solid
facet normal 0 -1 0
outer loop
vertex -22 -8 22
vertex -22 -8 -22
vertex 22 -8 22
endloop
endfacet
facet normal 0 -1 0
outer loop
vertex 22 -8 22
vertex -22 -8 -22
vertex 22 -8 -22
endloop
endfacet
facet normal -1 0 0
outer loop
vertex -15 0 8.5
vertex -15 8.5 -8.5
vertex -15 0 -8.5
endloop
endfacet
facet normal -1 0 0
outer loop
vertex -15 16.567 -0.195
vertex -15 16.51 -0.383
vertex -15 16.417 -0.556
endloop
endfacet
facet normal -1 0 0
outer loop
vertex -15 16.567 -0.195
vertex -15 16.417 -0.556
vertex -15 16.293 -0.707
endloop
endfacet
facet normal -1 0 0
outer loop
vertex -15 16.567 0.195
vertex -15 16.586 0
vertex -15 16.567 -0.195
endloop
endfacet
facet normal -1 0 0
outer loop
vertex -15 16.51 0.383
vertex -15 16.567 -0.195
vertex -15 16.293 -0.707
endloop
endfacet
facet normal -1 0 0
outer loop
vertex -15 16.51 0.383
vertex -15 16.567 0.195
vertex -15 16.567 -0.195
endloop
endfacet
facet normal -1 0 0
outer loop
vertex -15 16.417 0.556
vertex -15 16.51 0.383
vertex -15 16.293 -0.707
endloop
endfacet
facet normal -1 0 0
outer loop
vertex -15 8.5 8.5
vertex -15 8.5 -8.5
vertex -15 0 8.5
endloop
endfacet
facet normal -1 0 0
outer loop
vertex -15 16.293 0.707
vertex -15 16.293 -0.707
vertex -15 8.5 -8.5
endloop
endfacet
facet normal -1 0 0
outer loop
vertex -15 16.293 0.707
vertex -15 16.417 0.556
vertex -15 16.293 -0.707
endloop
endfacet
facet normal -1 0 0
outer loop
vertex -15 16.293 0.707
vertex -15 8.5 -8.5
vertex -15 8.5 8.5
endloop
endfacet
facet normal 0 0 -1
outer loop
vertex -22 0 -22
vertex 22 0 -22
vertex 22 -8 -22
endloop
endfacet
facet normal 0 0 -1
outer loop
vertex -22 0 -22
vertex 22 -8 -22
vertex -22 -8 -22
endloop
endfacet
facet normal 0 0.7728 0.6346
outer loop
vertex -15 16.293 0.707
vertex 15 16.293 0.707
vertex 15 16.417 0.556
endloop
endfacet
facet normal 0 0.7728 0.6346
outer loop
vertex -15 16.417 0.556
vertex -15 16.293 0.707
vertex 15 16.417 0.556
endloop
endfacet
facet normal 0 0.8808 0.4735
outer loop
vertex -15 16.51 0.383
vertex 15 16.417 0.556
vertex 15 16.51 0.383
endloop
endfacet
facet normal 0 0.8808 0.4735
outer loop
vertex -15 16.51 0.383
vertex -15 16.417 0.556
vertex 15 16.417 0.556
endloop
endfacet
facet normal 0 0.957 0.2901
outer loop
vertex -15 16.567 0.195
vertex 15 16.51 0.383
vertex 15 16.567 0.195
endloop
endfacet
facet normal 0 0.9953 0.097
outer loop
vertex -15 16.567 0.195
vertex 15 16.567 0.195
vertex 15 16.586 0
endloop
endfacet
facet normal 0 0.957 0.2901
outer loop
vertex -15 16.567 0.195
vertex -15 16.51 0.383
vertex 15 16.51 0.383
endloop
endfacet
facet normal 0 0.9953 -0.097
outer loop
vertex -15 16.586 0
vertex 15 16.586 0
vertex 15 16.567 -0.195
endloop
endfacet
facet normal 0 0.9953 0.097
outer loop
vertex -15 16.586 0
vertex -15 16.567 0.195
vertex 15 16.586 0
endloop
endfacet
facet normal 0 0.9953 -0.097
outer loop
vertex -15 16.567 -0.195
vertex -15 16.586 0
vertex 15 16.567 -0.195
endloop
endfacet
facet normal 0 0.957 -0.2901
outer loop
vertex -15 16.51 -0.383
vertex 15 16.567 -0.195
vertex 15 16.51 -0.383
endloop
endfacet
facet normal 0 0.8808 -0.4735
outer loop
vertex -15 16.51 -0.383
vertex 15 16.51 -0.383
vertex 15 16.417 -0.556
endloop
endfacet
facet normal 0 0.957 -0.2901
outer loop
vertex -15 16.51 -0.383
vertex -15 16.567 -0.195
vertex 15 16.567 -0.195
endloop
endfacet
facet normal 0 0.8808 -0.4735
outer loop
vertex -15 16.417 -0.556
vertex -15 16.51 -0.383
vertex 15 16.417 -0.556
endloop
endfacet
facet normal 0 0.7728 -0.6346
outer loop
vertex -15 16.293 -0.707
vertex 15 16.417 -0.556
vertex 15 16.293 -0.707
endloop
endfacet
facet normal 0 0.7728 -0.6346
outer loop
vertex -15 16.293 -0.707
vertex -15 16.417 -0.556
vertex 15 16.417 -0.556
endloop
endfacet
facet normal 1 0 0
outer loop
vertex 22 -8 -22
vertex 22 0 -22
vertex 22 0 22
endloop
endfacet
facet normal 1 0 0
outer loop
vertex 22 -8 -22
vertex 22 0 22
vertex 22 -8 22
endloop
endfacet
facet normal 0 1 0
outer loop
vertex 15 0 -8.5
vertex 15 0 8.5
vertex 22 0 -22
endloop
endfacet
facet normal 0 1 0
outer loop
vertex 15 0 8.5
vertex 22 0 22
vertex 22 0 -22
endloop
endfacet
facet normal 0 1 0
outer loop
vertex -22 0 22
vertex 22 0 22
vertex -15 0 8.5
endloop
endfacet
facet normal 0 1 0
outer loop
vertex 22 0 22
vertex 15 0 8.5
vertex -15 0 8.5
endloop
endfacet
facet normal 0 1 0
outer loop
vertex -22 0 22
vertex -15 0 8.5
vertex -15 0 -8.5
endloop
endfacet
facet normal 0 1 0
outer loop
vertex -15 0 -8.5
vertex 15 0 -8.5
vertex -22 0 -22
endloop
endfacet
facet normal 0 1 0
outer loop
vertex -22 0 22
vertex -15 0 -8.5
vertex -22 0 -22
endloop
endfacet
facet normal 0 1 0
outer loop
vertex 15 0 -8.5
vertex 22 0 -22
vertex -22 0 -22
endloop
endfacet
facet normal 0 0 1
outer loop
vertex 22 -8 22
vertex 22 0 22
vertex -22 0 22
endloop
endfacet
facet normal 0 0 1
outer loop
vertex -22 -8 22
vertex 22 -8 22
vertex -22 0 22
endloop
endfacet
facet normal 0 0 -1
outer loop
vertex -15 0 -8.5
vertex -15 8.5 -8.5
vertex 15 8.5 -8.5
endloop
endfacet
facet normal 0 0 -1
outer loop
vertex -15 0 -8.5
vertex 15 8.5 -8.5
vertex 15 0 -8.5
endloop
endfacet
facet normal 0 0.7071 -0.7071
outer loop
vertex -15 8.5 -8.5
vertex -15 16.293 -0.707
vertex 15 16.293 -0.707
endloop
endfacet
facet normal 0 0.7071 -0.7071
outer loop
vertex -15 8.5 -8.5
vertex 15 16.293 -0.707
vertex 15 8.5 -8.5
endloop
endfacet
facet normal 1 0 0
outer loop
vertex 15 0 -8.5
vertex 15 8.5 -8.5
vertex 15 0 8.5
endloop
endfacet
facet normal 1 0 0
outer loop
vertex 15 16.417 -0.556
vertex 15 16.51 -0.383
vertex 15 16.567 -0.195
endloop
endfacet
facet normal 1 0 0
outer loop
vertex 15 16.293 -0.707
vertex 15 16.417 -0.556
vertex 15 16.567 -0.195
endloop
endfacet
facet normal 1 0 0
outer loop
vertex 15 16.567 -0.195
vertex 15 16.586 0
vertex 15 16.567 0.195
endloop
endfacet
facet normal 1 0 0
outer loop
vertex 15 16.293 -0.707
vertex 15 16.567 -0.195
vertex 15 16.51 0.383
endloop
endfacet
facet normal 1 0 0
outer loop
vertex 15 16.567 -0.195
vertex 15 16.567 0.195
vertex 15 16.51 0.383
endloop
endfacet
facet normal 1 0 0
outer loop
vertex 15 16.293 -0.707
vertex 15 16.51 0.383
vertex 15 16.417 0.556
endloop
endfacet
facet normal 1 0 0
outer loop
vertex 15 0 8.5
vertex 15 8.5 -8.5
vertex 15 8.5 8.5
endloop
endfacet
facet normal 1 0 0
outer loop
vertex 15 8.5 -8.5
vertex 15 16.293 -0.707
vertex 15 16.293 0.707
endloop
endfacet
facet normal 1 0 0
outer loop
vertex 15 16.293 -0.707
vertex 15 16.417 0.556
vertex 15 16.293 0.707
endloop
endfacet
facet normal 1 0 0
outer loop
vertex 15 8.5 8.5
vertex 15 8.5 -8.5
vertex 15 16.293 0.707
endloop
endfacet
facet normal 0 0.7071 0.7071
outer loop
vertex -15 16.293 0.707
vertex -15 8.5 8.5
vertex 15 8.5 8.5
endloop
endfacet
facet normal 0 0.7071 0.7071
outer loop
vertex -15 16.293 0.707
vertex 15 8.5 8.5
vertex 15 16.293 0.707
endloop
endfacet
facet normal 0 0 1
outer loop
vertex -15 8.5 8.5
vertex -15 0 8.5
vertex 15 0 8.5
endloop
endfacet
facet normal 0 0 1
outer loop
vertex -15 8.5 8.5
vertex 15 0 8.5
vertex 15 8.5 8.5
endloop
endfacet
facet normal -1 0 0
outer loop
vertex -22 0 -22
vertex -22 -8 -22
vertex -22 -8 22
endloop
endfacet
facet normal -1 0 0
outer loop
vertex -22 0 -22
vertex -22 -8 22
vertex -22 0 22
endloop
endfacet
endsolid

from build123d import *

# Parameters (mm, degrees)
RESSALTO_EXTRUS_O1_DEPTH      = 22
RESSALTO_EXTRUS_O1_DEPTH_BACK = 22
RESSALTO_EXTRUS_O2_DEPTH      = 15
RESSALTO_EXTRUS_O2_DEPTH_BACK = 15


with BuildPart() as part:
    # Esboço2 → Ressalto-extrusão1 (new, two sides: drawn at the far end of the back side and taken through both)
    with BuildSketch(Plane.XY.offset(-RESSALTO_EXTRUS_O1_DEPTH_BACK)):
        Polygon((0, 0), (22, 0), (22, -8), (0, -8), (-22, -8), (-22, 0), align=None)
    extrude(amount=RESSALTO_EXTRUS_O1_DEPTH + RESSALTO_EXTRUS_O1_DEPTH_BACK)

    # Esboço4 → Ressalto-extrusão2 (add, two sides: drawn at the far end of the back side and taken through both)
    with BuildSketch(Plane(origin=(0, 0, 0), x_dir=(0, 0, -1), z_dir=(1, 0, 0)).offset(-RESSALTO_EXTRUS_O2_DEPTH_BACK)):
        with BuildLine():
            Line((-8.5, 8.5), (-0.707106781, 16.292893219))
            ThreePointArc((-0.707106781, 16.292893219), (0, 16.585786438), (0.707106781, 16.292893219))
            Line((0.707106781, 16.292893219), (8.5, 8.5))
            Line((8.5, 8.5), (8.5, 0))
            Line((8.5, 0), (0, 0))
            Line((0, 0), (-8.5, 0))
            Line((-8.5, 0), (-8.5, 8.5))
        make_face()
    extrude(amount=RESSALTO_EXTRUS_O2_DEPTH + RESSALTO_EXTRUS_O2_DEPTH_BACK)


solid = part.part
